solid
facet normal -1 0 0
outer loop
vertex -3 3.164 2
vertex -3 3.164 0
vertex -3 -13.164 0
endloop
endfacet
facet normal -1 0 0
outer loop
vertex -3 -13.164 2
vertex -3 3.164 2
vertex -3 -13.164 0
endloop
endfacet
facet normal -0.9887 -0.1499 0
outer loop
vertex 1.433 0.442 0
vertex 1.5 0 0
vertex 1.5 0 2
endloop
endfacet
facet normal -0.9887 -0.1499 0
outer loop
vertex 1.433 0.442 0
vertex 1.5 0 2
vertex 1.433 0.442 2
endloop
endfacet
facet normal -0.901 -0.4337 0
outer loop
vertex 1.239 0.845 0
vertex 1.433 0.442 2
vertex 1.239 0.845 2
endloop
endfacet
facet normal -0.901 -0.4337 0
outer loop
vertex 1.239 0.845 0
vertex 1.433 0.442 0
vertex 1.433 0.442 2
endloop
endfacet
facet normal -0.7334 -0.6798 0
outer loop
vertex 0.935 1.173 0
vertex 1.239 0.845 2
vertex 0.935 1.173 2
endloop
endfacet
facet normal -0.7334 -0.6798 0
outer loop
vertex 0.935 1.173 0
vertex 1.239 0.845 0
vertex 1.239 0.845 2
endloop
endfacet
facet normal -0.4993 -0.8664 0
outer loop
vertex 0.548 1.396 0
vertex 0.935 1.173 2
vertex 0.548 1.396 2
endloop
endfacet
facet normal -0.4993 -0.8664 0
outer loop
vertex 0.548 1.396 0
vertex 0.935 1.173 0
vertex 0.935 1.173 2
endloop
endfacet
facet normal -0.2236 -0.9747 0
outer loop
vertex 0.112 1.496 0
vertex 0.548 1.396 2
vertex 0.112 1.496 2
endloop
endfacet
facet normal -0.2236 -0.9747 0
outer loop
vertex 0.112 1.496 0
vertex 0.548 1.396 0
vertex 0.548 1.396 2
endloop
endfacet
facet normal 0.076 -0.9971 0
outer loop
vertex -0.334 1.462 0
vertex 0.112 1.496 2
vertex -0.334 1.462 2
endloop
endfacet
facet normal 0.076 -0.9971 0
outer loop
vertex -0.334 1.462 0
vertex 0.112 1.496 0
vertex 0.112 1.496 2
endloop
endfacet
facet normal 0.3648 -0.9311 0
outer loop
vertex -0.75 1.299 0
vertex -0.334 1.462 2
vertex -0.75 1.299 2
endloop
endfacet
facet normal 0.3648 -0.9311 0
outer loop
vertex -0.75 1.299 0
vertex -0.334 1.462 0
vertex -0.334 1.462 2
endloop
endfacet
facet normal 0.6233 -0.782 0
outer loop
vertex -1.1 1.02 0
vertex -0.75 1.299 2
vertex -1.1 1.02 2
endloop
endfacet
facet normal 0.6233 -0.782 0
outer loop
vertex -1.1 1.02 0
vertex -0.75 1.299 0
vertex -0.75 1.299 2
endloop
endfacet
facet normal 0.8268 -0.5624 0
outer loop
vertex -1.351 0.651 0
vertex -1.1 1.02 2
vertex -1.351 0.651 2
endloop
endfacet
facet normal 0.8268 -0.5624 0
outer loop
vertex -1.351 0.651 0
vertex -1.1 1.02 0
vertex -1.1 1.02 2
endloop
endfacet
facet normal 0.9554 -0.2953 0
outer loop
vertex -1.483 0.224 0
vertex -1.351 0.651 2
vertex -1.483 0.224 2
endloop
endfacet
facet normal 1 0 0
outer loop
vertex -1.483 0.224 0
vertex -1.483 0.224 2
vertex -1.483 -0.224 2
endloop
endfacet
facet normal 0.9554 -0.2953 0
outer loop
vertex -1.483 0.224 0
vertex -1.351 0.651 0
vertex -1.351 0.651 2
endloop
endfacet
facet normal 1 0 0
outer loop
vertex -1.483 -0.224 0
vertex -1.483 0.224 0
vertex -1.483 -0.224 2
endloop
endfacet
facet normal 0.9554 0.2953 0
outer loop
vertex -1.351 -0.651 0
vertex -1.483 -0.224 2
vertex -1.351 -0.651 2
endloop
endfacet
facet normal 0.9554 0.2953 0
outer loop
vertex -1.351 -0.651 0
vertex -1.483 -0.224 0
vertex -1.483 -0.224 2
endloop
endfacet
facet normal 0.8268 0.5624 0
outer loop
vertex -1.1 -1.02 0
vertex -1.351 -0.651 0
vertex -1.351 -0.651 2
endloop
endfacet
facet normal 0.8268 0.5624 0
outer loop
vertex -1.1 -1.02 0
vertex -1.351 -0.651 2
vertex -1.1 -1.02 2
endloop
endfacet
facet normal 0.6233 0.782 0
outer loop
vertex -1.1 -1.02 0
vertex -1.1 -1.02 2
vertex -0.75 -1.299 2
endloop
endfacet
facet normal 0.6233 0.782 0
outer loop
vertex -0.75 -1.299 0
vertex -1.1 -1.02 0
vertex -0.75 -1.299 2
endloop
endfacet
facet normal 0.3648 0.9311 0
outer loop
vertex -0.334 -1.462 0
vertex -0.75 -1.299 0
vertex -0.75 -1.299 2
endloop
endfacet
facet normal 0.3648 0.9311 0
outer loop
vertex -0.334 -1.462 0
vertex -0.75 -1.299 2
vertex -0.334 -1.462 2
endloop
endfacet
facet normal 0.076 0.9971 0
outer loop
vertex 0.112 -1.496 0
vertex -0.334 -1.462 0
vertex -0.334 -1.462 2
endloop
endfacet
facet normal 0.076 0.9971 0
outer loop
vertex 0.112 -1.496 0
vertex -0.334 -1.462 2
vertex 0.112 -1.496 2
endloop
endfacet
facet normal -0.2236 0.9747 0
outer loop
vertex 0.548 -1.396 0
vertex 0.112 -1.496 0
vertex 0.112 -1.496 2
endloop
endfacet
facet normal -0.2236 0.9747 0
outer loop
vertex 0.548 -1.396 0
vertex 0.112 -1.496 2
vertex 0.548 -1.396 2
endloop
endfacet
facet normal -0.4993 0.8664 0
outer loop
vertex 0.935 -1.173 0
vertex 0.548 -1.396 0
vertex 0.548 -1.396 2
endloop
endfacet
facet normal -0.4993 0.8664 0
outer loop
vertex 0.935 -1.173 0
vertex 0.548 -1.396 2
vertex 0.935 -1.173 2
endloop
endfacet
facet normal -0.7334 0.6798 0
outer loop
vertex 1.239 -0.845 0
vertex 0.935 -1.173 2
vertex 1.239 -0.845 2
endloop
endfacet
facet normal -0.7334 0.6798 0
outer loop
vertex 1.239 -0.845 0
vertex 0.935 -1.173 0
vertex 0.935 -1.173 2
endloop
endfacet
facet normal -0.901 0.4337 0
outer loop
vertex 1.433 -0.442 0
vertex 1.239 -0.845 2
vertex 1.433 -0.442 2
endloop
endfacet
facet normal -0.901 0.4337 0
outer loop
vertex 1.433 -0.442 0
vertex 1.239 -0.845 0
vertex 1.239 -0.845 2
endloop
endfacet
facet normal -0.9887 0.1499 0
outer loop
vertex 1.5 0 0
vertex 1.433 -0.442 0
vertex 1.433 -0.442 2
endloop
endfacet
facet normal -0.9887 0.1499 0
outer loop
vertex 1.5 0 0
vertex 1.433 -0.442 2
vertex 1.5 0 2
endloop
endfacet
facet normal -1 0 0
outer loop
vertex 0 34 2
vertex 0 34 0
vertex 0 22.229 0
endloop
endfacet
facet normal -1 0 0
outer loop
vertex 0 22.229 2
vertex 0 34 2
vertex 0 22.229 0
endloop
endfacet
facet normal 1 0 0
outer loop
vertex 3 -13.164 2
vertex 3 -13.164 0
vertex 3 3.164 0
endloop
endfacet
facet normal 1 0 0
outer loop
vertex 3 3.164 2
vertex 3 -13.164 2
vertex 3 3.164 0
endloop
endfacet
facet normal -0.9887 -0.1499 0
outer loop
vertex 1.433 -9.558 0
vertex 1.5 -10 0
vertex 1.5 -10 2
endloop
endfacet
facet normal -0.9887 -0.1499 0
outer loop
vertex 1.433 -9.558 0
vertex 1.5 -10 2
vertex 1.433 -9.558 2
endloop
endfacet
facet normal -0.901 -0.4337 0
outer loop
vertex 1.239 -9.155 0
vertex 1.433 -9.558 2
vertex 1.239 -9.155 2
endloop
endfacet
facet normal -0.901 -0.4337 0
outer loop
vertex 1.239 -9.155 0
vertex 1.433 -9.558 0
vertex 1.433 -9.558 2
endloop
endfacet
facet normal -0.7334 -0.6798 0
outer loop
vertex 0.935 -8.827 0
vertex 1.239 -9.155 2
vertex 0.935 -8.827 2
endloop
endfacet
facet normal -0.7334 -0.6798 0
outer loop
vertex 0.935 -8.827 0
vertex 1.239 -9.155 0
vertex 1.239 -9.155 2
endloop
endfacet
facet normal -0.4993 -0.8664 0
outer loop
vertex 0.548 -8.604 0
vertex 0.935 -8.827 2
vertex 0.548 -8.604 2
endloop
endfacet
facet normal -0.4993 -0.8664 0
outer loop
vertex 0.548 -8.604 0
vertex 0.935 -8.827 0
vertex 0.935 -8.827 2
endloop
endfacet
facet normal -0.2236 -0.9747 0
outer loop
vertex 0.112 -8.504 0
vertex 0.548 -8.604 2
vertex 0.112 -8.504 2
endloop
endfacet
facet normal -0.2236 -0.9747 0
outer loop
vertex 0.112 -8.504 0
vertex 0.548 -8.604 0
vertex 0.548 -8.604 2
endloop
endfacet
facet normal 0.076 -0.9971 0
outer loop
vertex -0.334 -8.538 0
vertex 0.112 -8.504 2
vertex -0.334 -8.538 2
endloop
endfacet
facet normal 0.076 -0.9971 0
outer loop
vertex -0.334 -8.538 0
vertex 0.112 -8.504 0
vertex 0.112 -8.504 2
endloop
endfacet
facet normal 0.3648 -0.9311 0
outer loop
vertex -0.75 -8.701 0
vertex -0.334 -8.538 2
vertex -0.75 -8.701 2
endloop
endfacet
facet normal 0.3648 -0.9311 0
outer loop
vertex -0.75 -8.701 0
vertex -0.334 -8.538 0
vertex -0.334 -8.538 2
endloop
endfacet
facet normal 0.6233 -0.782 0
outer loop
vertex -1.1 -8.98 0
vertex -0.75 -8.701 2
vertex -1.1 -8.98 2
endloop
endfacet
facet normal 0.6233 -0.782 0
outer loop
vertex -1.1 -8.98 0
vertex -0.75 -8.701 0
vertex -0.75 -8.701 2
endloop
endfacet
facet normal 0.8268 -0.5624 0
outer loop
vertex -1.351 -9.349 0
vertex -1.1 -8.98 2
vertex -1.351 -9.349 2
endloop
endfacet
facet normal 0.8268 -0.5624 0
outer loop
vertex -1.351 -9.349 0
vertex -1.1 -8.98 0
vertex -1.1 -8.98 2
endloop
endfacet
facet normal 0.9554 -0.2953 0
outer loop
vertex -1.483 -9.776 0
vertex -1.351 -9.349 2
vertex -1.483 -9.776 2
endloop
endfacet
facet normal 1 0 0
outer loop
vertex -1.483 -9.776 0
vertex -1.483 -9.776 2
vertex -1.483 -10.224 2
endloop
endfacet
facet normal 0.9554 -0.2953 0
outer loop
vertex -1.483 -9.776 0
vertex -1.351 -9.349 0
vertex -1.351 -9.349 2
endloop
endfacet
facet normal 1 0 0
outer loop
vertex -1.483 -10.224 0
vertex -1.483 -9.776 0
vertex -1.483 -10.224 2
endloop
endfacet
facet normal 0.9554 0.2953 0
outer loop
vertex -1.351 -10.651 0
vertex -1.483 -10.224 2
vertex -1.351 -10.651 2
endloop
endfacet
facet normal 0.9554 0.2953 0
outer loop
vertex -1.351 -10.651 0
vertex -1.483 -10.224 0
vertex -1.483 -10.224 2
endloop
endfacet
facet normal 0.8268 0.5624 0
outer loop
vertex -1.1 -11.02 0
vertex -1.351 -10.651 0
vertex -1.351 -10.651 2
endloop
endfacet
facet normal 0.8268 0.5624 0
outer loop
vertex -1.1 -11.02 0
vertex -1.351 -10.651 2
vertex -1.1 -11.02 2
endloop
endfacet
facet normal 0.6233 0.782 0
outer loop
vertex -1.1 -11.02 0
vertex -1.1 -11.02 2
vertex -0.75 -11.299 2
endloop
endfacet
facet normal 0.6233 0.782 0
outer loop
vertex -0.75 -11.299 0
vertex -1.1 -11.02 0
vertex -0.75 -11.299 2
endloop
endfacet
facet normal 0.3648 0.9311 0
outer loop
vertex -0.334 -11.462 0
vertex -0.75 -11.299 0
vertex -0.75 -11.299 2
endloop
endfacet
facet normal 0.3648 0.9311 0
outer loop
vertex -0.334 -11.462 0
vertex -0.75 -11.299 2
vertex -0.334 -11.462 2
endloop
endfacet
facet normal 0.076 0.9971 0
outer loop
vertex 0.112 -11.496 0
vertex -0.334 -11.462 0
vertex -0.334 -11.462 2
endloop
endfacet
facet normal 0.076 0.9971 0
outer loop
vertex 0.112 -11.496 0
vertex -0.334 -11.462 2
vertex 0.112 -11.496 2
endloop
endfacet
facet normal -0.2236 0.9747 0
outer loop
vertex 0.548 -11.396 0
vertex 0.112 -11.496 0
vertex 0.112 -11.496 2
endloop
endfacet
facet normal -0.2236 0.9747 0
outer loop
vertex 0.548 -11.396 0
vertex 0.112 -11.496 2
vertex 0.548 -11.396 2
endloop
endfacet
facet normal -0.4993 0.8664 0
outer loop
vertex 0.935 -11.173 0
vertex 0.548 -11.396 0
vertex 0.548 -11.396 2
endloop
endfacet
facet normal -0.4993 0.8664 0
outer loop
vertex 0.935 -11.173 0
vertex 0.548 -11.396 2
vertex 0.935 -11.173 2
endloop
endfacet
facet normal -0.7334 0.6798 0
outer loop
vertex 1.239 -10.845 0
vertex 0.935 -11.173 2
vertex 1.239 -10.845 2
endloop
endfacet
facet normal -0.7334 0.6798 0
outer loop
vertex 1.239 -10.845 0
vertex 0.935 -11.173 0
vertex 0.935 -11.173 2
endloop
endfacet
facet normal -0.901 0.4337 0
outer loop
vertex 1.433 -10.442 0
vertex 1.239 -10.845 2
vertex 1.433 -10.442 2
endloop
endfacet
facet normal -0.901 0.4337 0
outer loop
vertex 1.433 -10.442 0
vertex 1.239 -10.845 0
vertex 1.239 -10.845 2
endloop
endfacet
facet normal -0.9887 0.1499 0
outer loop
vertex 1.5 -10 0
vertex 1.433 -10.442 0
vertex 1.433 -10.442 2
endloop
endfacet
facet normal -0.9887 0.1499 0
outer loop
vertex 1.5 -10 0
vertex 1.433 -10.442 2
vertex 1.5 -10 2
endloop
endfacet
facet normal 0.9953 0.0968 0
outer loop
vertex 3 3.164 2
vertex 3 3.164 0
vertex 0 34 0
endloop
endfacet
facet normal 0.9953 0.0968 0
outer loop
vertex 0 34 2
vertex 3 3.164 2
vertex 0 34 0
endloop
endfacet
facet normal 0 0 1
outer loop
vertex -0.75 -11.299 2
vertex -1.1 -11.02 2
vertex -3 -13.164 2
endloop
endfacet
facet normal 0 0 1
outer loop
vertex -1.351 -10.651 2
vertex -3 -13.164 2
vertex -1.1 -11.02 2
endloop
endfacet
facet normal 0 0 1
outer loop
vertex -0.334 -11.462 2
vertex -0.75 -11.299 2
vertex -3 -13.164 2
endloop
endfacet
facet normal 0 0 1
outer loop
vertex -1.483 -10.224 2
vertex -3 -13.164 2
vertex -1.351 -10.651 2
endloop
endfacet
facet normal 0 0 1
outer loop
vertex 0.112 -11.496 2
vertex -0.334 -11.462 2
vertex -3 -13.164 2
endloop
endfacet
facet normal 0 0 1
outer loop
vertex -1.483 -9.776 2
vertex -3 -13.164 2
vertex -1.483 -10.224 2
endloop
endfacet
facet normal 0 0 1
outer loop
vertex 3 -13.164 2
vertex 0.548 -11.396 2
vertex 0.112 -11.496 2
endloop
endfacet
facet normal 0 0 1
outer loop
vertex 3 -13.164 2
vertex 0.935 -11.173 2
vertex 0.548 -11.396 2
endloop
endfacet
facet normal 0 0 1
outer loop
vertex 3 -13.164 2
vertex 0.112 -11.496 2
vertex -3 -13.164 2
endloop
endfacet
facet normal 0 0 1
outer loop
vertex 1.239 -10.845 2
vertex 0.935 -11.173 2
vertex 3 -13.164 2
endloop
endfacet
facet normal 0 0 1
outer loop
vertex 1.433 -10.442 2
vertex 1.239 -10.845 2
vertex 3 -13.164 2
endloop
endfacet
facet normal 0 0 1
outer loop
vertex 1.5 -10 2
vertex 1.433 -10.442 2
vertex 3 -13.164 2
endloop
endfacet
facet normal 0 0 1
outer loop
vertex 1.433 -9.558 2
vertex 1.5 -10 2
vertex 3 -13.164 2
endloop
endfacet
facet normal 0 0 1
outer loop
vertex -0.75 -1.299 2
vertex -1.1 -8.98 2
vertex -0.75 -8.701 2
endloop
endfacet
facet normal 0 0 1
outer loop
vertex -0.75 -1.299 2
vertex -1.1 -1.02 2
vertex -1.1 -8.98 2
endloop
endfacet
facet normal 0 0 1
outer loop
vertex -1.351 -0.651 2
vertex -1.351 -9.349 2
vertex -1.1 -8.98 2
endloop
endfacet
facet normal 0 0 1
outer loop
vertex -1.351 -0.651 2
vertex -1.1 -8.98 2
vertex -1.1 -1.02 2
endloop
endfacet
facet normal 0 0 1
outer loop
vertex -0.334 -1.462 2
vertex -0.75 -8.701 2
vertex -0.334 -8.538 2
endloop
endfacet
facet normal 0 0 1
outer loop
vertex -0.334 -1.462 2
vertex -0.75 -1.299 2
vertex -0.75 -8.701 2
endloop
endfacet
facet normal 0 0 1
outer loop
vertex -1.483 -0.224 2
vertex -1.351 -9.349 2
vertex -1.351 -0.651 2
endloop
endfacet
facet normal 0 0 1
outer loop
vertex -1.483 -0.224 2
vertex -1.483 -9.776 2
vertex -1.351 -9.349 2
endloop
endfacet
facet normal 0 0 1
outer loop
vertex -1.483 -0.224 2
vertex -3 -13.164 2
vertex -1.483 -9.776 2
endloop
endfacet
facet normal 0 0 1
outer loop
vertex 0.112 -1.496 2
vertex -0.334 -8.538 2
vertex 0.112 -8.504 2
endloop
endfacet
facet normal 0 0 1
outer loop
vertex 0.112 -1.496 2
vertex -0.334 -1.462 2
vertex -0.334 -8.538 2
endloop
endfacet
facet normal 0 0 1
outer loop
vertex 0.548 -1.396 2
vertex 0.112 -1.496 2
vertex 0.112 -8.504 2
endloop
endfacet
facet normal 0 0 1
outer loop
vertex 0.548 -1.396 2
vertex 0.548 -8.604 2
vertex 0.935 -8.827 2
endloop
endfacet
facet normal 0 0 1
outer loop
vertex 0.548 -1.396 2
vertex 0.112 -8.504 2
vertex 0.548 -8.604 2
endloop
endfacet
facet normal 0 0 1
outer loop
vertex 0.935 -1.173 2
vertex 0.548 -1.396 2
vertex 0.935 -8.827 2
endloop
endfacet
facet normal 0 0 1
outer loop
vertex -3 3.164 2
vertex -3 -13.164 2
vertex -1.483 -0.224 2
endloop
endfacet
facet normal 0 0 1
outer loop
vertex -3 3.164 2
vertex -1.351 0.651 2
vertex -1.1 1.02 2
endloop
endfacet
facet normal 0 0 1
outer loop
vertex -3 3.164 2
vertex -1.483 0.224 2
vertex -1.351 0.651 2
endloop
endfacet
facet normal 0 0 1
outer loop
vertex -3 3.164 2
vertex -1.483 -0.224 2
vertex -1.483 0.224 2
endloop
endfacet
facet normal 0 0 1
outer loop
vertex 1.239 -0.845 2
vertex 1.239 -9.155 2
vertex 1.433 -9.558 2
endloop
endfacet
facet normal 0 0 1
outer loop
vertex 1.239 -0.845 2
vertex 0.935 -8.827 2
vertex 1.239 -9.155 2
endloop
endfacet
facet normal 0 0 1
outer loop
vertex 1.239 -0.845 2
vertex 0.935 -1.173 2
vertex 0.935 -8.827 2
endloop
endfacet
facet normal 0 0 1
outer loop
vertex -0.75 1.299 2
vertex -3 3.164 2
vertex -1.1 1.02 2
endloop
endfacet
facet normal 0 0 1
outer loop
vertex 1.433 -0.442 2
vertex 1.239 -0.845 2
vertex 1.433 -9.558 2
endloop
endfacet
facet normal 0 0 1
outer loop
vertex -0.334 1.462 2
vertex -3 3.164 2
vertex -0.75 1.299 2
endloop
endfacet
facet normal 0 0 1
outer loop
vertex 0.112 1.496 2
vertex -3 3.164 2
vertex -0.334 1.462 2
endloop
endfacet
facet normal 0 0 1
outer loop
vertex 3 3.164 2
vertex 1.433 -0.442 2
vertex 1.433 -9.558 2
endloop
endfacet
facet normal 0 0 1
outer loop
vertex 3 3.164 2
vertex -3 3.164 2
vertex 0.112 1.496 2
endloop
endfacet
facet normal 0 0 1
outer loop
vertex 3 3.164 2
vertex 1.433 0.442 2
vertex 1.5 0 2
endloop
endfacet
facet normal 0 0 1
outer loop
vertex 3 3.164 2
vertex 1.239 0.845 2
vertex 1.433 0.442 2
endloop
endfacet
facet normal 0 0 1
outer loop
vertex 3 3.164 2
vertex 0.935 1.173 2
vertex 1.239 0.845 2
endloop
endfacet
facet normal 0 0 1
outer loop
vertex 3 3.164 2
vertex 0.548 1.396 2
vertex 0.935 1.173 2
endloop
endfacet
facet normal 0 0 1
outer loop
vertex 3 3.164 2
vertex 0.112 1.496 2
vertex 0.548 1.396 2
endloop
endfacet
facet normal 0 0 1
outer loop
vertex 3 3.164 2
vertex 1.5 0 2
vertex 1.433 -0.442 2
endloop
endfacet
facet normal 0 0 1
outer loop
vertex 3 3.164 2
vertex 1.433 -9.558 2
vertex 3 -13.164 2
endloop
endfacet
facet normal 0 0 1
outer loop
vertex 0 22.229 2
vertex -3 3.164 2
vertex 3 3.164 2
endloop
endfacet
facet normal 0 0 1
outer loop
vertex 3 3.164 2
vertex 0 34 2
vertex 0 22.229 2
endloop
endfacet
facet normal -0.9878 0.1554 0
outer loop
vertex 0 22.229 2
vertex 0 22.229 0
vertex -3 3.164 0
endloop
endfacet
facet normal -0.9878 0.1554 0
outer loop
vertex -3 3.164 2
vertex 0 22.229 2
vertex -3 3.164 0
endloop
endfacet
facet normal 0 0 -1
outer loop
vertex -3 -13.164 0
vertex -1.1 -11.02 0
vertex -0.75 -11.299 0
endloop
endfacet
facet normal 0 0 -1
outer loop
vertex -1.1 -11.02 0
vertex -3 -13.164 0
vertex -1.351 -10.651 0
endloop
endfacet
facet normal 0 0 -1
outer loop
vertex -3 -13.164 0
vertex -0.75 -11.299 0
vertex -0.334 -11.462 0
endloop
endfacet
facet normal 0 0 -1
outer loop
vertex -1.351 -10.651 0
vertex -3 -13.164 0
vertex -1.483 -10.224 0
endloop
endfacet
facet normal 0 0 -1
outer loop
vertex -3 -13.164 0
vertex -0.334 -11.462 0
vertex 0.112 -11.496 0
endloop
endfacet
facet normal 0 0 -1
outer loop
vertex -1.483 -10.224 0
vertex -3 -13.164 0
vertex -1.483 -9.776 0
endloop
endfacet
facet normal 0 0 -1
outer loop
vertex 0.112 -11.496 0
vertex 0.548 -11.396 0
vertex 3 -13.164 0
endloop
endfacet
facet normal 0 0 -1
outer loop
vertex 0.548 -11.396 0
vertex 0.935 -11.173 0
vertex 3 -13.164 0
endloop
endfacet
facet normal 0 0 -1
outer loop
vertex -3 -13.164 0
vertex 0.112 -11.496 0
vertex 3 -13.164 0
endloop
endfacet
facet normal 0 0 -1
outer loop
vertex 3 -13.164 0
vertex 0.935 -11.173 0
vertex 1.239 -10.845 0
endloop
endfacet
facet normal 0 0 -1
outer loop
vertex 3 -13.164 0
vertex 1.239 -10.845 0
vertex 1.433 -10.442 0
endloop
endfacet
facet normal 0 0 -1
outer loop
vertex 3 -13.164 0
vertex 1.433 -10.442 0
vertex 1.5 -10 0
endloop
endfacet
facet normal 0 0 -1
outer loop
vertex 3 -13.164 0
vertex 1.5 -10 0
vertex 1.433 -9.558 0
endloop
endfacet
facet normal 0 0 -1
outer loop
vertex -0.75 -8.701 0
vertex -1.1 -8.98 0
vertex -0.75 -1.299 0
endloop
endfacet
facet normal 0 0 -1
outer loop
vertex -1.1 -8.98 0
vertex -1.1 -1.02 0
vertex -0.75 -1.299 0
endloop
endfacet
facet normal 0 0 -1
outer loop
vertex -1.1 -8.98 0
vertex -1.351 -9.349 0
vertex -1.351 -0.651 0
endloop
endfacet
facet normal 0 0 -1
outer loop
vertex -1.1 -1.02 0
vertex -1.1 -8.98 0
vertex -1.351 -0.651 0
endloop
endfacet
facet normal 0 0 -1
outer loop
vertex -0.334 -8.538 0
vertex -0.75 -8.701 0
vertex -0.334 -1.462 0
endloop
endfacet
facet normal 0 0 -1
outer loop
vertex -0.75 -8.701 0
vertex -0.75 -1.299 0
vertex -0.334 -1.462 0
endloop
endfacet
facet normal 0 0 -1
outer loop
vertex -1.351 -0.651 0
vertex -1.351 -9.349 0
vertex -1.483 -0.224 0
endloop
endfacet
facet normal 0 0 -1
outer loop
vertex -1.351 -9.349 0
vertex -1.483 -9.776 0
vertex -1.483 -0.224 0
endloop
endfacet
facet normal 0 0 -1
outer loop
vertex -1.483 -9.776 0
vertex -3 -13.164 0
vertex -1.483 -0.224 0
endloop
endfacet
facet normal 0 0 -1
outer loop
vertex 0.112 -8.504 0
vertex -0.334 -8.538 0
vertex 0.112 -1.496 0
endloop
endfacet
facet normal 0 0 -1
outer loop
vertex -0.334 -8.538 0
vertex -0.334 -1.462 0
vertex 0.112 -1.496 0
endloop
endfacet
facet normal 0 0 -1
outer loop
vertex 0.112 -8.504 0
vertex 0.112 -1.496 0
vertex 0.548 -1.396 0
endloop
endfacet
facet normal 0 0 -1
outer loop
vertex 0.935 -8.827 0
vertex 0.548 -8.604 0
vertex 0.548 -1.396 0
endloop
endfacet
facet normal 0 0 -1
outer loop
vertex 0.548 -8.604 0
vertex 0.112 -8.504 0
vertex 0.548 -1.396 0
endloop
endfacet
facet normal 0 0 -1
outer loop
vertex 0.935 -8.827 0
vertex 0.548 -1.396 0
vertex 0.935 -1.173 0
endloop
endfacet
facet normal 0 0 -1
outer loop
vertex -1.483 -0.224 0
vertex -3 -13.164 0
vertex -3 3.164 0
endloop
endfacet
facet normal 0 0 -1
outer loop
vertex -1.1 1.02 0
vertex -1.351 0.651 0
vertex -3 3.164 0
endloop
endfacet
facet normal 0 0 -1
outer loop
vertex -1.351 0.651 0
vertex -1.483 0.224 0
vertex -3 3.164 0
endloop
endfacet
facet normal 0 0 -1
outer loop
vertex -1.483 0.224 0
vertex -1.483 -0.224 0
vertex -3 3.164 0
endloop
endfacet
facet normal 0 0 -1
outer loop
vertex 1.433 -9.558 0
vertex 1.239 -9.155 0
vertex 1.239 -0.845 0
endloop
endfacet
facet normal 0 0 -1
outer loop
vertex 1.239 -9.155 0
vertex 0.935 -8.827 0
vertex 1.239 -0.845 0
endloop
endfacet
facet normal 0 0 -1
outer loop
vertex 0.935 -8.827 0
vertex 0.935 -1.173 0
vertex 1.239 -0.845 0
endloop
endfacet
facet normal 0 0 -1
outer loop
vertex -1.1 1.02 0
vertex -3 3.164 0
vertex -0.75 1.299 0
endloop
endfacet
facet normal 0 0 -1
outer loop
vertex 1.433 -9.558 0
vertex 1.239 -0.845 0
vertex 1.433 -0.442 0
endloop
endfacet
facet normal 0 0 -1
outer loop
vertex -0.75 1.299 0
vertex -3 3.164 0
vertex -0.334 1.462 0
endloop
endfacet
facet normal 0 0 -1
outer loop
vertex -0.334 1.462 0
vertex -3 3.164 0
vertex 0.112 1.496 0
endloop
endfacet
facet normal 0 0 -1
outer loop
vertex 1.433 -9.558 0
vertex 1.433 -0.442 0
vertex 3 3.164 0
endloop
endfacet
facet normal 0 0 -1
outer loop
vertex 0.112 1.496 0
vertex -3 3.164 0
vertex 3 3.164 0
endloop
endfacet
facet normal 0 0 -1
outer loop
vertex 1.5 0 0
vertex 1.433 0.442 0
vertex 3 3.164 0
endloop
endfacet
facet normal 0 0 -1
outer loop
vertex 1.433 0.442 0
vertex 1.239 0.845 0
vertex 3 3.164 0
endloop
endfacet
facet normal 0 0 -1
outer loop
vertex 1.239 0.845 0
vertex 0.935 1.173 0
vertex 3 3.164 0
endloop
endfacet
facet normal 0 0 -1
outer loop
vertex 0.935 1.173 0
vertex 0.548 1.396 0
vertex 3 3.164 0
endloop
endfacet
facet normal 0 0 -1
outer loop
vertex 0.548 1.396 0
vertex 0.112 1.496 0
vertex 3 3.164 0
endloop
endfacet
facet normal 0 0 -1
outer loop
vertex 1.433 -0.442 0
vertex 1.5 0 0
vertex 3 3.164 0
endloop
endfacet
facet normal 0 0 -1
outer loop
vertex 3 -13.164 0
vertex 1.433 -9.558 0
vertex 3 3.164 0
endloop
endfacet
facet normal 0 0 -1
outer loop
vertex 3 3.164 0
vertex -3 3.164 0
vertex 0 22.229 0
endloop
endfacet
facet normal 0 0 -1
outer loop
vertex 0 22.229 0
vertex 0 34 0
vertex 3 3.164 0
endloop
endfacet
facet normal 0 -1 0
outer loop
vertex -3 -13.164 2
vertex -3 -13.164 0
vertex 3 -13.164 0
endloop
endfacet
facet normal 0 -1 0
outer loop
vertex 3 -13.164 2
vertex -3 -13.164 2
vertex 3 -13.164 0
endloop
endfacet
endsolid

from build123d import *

# Parameters (mm, degrees)
SKETCH_1_R      = 1.5
EXTRUDE_1_DEPTH = 2


with BuildPart() as part:
    # 草图1 → 凸台-拉伸1 (new body)
    with BuildSketch(Plane.XY):
        Polygon((3, 3.164176285), (0, 34), (0, 22.228513357), (-3, 3.164176285), (-3, -13.164176285), (3, -13.164176285), align=None)
        Circle(SKETCH_1_R, mode=Mode.SUBTRACT)
        with Locations((0, -10)):
            Circle(SKETCH_1_R, mode=Mode.SUBTRACT)
    extrude(amount=EXTRUDE_1_DEPTH)


solid = part.part
